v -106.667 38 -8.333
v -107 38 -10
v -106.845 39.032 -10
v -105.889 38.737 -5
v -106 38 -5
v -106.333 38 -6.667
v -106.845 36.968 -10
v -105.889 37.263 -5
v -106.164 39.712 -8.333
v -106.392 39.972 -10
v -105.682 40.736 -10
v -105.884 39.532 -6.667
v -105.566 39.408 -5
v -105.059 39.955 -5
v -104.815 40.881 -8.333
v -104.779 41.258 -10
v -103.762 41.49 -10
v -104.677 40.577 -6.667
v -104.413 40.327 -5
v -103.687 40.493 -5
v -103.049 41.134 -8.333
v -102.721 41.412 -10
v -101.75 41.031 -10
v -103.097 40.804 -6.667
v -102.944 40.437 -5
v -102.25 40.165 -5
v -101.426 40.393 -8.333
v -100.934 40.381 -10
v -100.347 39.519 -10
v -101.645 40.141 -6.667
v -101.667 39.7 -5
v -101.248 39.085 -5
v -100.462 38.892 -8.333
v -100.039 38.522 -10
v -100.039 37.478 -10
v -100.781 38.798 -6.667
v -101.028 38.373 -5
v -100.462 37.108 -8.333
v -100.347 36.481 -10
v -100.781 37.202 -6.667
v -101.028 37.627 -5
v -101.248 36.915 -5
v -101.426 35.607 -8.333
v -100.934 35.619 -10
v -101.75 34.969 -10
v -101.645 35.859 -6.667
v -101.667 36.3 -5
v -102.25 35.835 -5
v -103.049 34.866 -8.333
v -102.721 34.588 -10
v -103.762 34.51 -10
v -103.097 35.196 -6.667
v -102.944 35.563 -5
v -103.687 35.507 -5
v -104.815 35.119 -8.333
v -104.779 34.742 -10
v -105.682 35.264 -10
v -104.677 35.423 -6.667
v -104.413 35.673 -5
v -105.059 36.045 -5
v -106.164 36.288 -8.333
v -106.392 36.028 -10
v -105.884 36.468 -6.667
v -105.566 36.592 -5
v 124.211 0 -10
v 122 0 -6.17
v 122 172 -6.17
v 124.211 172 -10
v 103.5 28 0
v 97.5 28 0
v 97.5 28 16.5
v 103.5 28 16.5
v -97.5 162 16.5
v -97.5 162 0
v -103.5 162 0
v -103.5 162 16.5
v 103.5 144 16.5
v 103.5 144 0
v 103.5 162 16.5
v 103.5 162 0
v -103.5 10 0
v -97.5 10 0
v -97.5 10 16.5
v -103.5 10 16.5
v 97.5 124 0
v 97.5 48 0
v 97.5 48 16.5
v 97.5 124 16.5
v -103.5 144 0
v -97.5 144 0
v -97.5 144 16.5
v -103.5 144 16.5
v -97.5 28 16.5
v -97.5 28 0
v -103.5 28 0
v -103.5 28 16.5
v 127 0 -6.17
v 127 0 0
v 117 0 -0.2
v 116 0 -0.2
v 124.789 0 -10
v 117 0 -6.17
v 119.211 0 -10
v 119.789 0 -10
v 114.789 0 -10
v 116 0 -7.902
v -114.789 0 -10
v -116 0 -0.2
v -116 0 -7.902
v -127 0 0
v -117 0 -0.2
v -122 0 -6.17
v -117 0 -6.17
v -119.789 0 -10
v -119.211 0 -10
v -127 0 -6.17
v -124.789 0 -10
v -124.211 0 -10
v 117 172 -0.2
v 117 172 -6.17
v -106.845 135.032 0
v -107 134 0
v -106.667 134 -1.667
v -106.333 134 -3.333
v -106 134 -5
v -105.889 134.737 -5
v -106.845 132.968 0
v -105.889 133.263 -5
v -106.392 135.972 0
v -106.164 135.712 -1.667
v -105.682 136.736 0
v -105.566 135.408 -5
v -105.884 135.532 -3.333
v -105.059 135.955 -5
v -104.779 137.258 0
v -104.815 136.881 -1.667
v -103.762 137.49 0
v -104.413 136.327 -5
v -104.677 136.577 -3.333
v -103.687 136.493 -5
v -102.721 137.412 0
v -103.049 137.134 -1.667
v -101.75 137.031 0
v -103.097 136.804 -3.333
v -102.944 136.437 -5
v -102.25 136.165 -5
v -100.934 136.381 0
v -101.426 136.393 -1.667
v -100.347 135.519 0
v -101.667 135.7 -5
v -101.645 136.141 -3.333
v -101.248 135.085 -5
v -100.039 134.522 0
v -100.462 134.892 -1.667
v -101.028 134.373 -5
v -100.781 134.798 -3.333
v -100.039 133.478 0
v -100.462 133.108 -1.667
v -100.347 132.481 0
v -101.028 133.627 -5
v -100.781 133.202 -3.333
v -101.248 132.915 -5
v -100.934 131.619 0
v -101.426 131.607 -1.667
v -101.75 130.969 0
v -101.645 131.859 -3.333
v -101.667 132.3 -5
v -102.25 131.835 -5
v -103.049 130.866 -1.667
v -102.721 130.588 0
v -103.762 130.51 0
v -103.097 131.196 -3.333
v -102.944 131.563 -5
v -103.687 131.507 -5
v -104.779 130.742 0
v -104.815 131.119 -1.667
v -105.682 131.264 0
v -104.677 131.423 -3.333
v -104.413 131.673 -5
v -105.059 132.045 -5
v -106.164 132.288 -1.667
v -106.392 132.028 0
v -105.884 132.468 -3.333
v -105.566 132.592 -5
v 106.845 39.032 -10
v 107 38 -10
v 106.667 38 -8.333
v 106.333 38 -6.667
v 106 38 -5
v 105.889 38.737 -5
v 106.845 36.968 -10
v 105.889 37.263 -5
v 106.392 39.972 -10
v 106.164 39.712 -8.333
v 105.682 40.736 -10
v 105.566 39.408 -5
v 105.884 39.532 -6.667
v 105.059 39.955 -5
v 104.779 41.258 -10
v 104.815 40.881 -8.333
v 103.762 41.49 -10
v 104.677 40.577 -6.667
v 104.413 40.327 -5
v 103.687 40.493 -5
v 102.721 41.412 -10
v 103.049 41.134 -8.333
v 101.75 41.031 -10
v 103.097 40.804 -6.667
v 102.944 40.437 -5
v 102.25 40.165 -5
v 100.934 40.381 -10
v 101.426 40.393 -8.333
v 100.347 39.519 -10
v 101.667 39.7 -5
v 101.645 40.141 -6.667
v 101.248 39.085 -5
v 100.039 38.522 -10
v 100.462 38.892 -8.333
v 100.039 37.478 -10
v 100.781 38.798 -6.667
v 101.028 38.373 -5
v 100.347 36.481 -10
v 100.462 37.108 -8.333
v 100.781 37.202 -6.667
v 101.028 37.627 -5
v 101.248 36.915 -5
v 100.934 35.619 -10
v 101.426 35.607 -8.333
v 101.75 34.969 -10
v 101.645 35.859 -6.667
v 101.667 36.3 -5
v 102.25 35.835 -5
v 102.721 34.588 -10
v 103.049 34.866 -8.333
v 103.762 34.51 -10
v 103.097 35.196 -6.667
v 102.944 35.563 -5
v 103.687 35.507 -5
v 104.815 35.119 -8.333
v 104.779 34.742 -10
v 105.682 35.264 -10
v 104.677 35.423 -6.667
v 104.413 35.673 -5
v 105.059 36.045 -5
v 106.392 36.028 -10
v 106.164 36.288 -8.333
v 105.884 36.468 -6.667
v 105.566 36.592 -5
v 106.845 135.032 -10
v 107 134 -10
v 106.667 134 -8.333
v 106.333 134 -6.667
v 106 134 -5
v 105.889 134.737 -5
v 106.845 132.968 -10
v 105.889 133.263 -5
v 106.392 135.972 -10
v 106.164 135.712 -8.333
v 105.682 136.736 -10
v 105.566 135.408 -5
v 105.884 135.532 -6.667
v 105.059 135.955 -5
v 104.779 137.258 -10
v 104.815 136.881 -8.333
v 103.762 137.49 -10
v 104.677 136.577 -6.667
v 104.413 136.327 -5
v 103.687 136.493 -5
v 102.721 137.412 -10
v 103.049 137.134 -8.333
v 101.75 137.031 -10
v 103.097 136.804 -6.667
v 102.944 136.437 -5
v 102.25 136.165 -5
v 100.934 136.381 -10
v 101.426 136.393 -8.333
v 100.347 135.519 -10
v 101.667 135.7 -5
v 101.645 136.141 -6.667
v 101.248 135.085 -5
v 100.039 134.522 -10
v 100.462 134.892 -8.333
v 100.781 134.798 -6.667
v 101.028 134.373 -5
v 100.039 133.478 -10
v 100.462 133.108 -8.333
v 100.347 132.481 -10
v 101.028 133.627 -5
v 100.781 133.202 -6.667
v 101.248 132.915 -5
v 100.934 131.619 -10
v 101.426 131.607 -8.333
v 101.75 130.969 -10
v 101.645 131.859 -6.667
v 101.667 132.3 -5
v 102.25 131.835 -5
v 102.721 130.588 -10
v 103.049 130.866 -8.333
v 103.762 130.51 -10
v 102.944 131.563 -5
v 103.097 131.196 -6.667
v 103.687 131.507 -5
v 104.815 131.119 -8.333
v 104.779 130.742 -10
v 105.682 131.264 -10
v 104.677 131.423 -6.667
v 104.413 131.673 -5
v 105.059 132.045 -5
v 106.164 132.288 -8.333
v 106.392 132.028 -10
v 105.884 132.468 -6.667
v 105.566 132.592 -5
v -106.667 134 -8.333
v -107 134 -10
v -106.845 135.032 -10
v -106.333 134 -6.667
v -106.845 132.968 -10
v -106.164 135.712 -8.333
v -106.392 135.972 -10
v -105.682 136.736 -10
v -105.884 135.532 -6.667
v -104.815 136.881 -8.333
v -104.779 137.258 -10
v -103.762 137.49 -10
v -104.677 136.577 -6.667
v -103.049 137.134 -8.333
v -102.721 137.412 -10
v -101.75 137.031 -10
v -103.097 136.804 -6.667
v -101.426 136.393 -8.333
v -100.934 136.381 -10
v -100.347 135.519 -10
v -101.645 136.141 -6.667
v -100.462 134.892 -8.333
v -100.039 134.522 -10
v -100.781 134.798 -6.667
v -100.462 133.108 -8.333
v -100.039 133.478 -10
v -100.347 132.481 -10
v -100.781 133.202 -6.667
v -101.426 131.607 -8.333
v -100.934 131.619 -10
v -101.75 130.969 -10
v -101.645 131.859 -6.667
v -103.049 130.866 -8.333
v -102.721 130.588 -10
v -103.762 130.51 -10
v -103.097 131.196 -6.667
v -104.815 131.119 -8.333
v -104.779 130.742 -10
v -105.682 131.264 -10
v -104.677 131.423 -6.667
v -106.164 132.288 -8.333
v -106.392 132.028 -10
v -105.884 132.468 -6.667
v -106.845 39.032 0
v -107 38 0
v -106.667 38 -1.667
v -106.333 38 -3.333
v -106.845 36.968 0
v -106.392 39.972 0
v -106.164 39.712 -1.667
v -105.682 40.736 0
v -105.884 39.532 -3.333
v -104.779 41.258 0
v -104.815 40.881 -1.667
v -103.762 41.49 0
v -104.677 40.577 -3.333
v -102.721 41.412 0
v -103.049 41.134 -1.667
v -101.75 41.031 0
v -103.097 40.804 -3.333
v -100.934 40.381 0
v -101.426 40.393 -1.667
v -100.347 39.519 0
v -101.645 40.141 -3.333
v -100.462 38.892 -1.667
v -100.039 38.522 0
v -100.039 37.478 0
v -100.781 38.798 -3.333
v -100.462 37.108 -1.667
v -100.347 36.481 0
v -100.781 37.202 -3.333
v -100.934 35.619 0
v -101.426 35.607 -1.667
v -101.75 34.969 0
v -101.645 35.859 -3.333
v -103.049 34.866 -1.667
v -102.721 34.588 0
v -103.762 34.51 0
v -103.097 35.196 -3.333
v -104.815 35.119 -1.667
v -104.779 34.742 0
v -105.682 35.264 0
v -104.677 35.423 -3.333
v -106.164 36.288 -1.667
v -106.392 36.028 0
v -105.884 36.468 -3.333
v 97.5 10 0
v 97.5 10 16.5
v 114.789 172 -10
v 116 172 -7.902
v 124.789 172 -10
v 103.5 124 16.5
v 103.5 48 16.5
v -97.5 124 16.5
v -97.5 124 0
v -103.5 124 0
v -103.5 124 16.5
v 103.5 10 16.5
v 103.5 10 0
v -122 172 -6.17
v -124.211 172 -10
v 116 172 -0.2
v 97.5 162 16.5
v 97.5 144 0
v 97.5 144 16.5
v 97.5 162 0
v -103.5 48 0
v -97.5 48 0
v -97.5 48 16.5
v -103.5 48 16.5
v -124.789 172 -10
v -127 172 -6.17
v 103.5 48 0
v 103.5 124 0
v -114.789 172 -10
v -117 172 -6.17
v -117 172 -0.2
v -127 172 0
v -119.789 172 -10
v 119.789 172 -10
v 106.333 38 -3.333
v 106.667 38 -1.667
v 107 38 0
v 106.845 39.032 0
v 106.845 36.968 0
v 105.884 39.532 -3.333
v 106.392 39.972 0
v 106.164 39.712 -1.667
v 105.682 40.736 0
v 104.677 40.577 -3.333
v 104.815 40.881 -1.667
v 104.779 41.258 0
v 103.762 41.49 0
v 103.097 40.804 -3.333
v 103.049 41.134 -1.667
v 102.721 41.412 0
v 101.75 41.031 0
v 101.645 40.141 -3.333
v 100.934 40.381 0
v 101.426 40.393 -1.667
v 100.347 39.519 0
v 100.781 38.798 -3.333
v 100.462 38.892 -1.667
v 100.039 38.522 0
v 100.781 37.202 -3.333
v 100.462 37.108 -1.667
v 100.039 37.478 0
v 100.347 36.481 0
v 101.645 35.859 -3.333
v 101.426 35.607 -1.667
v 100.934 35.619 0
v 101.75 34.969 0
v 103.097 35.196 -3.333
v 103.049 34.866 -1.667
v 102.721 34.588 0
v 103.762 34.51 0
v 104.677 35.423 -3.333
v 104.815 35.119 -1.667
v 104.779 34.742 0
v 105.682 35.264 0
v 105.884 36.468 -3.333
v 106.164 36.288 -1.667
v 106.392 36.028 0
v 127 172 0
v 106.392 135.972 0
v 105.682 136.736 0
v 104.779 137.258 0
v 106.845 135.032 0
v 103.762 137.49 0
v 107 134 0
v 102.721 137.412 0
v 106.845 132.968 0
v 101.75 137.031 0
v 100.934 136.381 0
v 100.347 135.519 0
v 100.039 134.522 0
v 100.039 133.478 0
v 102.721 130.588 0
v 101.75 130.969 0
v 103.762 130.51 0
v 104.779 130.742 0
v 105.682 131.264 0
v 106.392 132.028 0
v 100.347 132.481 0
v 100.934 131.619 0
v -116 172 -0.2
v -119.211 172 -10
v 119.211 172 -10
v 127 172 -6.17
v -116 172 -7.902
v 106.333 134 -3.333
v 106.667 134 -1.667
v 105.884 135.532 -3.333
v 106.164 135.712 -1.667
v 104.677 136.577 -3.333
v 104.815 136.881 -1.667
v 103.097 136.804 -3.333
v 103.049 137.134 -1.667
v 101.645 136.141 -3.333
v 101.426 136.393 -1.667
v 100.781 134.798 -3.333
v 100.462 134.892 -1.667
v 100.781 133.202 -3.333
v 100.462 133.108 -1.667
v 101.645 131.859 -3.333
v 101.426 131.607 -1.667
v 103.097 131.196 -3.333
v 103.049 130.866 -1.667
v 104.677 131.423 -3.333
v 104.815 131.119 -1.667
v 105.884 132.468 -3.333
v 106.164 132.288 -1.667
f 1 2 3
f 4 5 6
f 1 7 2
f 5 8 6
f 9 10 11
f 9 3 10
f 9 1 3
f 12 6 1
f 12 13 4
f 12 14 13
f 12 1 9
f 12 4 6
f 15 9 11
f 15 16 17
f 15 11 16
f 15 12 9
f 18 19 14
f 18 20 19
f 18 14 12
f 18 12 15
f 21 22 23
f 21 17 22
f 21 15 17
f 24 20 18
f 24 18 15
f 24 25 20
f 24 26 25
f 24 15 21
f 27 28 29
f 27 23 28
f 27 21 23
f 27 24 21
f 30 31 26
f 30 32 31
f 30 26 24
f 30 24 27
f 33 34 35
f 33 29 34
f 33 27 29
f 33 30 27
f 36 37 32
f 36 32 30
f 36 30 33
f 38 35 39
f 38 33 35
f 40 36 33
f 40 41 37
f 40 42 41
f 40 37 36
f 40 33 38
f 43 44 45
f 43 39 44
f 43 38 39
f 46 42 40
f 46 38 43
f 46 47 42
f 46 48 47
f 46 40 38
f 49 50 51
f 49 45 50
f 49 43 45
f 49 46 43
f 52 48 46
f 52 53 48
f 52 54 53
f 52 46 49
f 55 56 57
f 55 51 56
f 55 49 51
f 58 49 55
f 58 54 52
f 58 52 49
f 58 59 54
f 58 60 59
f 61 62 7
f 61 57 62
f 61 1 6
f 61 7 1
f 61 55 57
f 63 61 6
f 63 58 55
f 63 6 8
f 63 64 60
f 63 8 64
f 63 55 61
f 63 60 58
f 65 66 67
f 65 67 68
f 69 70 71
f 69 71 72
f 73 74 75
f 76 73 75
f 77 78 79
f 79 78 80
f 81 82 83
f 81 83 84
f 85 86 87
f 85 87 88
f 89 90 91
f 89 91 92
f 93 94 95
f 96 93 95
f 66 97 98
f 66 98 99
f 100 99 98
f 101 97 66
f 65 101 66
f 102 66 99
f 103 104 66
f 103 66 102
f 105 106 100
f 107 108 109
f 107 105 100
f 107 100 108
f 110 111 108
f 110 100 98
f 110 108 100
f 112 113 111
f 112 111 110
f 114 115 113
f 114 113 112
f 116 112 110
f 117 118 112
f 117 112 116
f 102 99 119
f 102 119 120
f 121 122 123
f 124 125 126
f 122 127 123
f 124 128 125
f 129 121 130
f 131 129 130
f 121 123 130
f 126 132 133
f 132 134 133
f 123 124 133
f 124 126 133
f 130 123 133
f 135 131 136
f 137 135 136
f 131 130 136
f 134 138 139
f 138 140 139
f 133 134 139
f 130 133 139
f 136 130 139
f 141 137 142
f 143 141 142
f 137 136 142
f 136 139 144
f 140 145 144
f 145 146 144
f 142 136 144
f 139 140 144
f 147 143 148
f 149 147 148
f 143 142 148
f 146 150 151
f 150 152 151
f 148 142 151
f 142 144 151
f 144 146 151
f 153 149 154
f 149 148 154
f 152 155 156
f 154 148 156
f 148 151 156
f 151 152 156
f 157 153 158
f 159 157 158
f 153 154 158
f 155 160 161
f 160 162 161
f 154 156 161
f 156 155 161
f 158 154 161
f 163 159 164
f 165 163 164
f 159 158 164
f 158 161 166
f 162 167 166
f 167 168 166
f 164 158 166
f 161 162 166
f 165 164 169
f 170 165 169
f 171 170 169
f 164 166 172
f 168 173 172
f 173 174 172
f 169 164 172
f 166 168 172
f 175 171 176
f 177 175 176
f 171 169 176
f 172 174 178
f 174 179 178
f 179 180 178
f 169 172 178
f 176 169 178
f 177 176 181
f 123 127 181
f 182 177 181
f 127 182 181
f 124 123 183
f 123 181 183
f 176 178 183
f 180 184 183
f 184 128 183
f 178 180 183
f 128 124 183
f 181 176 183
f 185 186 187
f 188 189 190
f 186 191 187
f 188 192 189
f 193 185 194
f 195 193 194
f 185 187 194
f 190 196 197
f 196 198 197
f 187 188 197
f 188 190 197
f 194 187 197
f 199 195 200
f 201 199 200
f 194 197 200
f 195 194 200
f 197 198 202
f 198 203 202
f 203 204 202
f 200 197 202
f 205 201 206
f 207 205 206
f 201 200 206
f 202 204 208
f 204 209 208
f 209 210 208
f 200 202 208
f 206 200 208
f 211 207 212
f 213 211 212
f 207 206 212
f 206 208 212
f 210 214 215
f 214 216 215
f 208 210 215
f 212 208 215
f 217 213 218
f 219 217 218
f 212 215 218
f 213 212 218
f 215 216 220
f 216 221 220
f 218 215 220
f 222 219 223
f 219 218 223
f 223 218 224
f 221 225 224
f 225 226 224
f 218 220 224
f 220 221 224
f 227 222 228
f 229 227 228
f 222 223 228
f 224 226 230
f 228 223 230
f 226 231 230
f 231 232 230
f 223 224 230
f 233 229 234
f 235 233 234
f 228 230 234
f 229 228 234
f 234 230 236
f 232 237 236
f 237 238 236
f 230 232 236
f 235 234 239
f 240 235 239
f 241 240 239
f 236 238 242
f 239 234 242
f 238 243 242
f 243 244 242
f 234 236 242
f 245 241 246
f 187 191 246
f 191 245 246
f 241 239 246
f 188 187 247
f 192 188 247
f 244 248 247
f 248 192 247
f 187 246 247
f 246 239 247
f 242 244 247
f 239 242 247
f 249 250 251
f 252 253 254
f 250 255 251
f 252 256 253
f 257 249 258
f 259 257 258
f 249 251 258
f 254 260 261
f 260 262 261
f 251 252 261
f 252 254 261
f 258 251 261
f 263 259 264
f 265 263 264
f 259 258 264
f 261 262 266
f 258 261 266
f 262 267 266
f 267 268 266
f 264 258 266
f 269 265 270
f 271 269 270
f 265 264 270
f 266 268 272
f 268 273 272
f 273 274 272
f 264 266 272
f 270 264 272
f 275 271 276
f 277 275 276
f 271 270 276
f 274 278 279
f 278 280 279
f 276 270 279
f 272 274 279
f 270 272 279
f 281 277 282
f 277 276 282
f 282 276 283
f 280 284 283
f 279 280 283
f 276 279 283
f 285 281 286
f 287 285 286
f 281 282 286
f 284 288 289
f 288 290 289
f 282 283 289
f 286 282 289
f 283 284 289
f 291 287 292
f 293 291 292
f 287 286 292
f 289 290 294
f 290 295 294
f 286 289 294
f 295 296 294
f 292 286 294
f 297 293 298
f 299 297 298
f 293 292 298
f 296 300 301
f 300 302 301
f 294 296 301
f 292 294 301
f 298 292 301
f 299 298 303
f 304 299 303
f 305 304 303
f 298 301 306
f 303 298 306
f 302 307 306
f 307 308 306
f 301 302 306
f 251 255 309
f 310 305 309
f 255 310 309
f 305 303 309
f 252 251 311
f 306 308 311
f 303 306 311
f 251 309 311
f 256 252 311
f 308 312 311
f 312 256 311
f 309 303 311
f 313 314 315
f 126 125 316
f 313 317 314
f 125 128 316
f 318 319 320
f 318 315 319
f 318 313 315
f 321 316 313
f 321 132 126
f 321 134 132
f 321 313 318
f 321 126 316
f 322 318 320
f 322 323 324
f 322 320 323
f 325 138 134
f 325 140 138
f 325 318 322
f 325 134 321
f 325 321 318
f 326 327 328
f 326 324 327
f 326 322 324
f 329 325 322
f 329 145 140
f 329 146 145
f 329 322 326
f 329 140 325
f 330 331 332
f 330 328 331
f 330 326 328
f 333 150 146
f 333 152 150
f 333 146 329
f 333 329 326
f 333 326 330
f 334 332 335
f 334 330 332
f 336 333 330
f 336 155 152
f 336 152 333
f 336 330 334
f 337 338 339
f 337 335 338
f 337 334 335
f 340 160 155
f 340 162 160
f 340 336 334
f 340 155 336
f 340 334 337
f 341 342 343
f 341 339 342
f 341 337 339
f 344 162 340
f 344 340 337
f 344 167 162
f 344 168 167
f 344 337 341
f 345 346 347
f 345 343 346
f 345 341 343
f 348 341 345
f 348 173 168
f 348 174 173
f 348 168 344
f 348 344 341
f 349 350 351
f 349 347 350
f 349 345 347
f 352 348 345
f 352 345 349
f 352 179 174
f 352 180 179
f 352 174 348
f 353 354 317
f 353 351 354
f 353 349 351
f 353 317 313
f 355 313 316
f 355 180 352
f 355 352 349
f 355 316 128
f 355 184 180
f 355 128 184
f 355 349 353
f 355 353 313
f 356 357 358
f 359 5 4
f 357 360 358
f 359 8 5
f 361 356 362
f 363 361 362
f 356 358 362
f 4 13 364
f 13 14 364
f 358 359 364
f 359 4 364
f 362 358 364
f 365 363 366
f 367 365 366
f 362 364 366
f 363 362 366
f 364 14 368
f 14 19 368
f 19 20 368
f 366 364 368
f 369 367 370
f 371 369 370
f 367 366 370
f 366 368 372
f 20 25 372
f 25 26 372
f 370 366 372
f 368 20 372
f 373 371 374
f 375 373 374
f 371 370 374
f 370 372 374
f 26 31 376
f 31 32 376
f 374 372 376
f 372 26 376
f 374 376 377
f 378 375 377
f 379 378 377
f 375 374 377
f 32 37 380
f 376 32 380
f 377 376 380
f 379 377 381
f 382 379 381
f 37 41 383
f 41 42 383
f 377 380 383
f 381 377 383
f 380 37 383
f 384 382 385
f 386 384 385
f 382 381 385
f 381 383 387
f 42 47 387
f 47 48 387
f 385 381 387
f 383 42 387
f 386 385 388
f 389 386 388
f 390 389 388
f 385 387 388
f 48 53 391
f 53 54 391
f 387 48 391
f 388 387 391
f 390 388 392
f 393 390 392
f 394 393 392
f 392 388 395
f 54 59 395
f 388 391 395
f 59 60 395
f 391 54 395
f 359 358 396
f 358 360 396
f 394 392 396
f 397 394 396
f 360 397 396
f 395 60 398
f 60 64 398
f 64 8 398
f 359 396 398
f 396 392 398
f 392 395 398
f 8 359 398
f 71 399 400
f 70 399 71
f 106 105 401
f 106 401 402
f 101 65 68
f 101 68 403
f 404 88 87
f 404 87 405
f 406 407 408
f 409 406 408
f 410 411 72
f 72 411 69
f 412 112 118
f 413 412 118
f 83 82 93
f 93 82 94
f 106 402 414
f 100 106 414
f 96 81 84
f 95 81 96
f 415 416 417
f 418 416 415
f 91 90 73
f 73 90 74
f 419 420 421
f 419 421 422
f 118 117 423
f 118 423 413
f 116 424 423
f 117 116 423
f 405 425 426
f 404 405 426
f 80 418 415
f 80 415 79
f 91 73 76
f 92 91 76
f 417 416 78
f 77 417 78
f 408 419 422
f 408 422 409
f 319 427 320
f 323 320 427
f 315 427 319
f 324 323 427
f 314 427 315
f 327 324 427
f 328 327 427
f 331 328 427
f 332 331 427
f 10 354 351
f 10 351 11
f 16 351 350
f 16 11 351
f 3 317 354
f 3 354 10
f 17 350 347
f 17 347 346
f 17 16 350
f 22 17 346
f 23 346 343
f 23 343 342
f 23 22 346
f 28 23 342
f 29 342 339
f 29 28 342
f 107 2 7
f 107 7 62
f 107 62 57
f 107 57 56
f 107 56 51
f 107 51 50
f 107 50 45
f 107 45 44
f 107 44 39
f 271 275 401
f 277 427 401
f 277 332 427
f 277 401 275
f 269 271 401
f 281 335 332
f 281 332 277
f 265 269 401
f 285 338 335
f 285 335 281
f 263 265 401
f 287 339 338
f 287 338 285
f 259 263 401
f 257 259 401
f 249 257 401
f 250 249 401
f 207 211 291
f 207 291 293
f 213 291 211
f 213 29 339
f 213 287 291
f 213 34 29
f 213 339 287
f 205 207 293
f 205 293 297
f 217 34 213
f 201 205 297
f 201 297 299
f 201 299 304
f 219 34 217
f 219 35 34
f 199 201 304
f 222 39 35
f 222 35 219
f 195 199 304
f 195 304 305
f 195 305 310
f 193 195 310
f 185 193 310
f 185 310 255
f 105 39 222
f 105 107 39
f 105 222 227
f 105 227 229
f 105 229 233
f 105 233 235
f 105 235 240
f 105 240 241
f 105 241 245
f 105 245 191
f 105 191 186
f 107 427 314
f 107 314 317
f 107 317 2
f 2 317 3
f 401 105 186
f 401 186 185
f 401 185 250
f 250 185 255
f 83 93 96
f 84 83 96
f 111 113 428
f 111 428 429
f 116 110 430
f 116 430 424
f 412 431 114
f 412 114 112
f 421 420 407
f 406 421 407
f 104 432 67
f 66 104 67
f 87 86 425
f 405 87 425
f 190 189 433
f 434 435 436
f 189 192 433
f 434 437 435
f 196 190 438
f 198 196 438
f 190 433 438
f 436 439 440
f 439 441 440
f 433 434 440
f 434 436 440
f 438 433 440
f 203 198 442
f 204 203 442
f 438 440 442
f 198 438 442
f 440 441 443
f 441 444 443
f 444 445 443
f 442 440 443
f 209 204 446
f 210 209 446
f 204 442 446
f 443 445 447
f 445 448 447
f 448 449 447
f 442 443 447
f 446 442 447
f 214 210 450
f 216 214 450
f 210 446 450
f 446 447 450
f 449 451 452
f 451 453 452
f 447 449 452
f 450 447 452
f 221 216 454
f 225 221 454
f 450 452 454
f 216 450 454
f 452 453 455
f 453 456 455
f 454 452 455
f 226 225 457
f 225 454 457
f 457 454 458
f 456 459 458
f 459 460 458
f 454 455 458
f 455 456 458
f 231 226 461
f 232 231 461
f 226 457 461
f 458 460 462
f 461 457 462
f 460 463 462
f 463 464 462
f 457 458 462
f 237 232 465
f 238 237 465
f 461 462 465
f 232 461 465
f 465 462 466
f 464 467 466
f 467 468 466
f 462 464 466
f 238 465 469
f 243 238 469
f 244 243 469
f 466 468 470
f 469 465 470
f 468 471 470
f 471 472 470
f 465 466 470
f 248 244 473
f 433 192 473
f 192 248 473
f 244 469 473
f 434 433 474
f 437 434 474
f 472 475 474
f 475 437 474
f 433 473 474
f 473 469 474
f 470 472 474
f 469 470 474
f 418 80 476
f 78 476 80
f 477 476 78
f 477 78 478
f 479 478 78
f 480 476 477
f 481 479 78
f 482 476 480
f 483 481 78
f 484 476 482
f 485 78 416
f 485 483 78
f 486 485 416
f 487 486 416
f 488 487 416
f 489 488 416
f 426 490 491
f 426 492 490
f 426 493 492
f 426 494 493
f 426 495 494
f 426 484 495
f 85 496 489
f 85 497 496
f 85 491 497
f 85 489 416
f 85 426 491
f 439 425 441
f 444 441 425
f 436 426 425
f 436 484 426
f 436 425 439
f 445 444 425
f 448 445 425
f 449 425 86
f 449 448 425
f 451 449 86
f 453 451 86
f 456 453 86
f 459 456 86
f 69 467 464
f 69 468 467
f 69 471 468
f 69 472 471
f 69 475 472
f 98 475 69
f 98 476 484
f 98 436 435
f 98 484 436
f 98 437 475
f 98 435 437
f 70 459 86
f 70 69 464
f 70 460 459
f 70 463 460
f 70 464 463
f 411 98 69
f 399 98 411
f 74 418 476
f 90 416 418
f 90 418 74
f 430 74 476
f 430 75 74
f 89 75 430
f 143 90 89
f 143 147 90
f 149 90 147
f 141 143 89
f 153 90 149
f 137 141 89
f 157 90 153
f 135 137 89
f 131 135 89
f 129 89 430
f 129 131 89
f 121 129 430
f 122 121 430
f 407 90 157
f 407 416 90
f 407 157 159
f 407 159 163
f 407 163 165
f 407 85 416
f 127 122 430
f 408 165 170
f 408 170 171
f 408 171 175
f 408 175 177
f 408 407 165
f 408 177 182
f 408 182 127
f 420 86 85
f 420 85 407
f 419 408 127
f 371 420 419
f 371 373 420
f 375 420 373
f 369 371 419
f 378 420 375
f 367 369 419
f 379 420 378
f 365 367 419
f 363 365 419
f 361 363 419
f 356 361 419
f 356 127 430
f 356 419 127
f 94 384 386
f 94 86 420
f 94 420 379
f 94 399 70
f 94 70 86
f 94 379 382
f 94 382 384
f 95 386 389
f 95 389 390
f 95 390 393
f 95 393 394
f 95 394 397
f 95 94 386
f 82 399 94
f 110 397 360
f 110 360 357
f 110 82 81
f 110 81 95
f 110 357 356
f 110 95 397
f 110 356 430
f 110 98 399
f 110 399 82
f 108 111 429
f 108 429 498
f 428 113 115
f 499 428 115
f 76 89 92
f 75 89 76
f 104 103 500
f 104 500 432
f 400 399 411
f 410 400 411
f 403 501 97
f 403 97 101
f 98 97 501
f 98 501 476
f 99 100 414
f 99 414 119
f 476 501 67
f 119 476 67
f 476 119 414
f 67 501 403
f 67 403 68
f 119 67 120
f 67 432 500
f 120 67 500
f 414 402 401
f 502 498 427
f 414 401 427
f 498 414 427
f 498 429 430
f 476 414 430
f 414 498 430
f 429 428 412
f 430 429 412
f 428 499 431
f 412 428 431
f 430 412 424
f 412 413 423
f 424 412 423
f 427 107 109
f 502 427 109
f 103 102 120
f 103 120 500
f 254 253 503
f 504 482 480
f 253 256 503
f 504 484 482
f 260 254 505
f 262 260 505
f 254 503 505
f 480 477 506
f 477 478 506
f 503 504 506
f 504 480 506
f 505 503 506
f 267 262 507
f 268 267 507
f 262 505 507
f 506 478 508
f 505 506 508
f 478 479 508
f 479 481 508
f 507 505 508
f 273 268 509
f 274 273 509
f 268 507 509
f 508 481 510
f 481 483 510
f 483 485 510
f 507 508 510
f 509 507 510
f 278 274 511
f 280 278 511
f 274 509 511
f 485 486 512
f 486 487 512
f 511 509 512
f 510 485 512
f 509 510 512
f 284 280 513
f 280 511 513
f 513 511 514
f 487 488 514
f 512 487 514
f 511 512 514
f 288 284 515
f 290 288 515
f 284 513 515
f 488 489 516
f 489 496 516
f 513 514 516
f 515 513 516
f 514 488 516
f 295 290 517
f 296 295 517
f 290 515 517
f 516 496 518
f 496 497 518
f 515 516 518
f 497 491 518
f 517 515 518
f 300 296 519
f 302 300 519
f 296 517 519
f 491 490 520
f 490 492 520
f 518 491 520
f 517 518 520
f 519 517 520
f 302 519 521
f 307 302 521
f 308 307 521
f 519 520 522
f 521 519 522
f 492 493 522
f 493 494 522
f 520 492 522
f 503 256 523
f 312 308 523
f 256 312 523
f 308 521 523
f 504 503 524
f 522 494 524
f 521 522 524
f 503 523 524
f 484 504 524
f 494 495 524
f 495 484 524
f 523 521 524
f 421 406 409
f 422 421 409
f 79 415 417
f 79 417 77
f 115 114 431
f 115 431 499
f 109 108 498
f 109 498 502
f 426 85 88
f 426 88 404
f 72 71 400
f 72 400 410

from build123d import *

# Parameters (mm, degrees)
MAIN_BODY_DEPTH     = 172
SKETCH2_R           = 3.5
SKETCH3_R           = 2.5
SKETCH2_3_R         = 3.5
SKETCH3_3_R         = 2.5
SKETCH4_W           = 6
SKETCH4_H           = 76
SKETCH4_H_2         = 18
BOSS_EXTRUDE1_DEPTH = 16.5
CUT_EXTRUDE1_DEPTH  = 215.441717024
LPATTERN1_DEPTH     = 172


# Read off the part's stored shape, not the designer's step: Mirror2, LPattern1
with BuildPart() as part:
    # Sketch1 → Main Body (new body)
    with BuildSketch(Plane(origin=(0, 0, 0), x_dir=(1, 0, 0), z_dir=(0, 1, 0))):
        Polygon((-127, 0), (-127, 10), (-117, 10), (-117, 0.2), (-116, 0.2), (-116, 10), (116, 10), (116, 0.2), (117, 0.2), (117, 10), (127, 10), (127, 0), align=None)
    extrude(amount=MAIN_BODY_DEPTH)

    # Sketch2 → Cut-Loft2 section 0
    with BuildSketch(Plane(origin=(0, 0, -10), x_dir=(-1, 0, 0), z_dir=(0, 0, -1))):
        with Locations((103.5, 134)):
            Circle(SKETCH2_R)
    # Sketch3 → Cut-Loft2 section 1
    with BuildSketch(Plane.XY.offset(-5)):
        with Locations((-103.5, 134)):
            Circle(SKETCH3_R)
    cut_loft2 = loft(mode=Mode.SUBTRACT)

    # Sketch2<3> → Cut-Loft3 section 0
    with BuildSketch(Plane(origin=(0, 0, -10), x_dir=(-1, 0, 0), z_dir=(0, 0, -1))):
        with Locations((103.5, 38)):
            Circle(SKETCH2_3_R)
    # Sketch3<3> → Cut-Loft3 section 1
    with BuildSketch(Plane.XY.offset(-5)):
        with Locations((-103.5, 38)):
            Circle(SKETCH3_3_R)
    cut_loft3 = loft(mode=Mode.SUBTRACT)

    # Mirror1: Cut-Loft2, Cut-Loft3 across plane
    add(cut_loft2.mirror(Plane.XY.offset(-5)), mode=Mode.SUBTRACT)
    add(cut_loft3.mirror(Plane.XY.offset(-5)), mode=Mode.SUBTRACT)

    # Mirror2 outline → Mirror2 (revolve, cut)
    with BuildSketch(Plane(origin=(103.5, 134, 0), x_dir=(1, 0, 0), z_dir=(0, -1, 0))):
        Polygon((3.5, -10), (2.5, -5), (3.5, 0), (0, 0), (0, -10), align=None)
    revolve(axis=Axis((103.5, 134, 0), (0, 0, 1)), mode=Mode.SUBTRACT)

    # Mirror2 2 outline → Mirror2 2 (revolve, cut)
    with BuildSketch(Plane(origin=(103.5, 38, 0), x_dir=(1, 0, 0), z_dir=(0, -1, 0))):
        Polygon((3.5, -10), (2.5, -5), (3.5, 0), (0, 0), (0, -10), align=None)
    revolve(axis=Axis((103.5, 38, 0), (0, 0, 1)), mode=Mode.SUBTRACT)

    # Sketch4 → Boss-Extrude1 (add)
    with BuildSketch(Plane.XY):
        with Locations((100.5, 86)):
            Rectangle(SKETCH4_W, SKETCH4_H)
        with Locations((100.5, 153)):
            Rectangle(SKETCH4_W, SKETCH4_H_2)
        with Locations((100.5, 19)):
            Rectangle(SKETCH4_W, SKETCH4_H_2)
    boss_extrude1 = extrude(amount=BOSS_EXTRUDE1_DEPTH)

    # Mirror3: Boss-Extrude1 across plane
    add(boss_extrude1.mirror(Plane(origin=(0, 0, 0), x_dir=(0, 0, 1), z_dir=(1, 0, 0))))

    # Sketch5 → Cut-Extrude1 (cut, through all)
    with BuildSketch(Plane(origin=(0, 172, 0), x_dir=(1, 0, 0), z_dir=(0, 1, 0))):
        Polygon((129.5, 10.5), (127, 6.169872981), (124.5, 10.5), align=None)
    cut_extrude1 = extrude(amount=-CUT_EXTRUDE1_DEPTH, mode=Mode.SUBTRACT)

    # LPattern1 outline → LPattern1 (cut)
    with BuildSketch(Plane(origin=(0, 0, 0), x_dir=(1, 0, 0), z_dir=(0, 1, 0))):
        Polygon((119.788675135, 10), (122, 6.169872981), (124.211324865, 10), align=None)
        Polygon((117, 6.169872981), (119.211324865, 10), (117, 10), align=None)
        Polygon((116, 10), (114.788675135, 10), (116, 7.901923789), align=None)
    lpattern1 = extrude(amount=LPATTERN1_DEPTH, mode=Mode.SUBTRACT)

    # Mirror4: Cut-Extrude1, LPattern1 across plane
    add(cut_extrude1.mirror(Plane(origin=(0, 0, 0), x_dir=(0, 0, 1), z_dir=(1, 0, 0))), mode=Mode.SUBTRACT)
    add(lpattern1.mirror(Plane(origin=(0, 0, 0), x_dir=(0, 0, 1), z_dir=(1, 0, 0))), mode=Mode.SUBTRACT)


solid = part.part
